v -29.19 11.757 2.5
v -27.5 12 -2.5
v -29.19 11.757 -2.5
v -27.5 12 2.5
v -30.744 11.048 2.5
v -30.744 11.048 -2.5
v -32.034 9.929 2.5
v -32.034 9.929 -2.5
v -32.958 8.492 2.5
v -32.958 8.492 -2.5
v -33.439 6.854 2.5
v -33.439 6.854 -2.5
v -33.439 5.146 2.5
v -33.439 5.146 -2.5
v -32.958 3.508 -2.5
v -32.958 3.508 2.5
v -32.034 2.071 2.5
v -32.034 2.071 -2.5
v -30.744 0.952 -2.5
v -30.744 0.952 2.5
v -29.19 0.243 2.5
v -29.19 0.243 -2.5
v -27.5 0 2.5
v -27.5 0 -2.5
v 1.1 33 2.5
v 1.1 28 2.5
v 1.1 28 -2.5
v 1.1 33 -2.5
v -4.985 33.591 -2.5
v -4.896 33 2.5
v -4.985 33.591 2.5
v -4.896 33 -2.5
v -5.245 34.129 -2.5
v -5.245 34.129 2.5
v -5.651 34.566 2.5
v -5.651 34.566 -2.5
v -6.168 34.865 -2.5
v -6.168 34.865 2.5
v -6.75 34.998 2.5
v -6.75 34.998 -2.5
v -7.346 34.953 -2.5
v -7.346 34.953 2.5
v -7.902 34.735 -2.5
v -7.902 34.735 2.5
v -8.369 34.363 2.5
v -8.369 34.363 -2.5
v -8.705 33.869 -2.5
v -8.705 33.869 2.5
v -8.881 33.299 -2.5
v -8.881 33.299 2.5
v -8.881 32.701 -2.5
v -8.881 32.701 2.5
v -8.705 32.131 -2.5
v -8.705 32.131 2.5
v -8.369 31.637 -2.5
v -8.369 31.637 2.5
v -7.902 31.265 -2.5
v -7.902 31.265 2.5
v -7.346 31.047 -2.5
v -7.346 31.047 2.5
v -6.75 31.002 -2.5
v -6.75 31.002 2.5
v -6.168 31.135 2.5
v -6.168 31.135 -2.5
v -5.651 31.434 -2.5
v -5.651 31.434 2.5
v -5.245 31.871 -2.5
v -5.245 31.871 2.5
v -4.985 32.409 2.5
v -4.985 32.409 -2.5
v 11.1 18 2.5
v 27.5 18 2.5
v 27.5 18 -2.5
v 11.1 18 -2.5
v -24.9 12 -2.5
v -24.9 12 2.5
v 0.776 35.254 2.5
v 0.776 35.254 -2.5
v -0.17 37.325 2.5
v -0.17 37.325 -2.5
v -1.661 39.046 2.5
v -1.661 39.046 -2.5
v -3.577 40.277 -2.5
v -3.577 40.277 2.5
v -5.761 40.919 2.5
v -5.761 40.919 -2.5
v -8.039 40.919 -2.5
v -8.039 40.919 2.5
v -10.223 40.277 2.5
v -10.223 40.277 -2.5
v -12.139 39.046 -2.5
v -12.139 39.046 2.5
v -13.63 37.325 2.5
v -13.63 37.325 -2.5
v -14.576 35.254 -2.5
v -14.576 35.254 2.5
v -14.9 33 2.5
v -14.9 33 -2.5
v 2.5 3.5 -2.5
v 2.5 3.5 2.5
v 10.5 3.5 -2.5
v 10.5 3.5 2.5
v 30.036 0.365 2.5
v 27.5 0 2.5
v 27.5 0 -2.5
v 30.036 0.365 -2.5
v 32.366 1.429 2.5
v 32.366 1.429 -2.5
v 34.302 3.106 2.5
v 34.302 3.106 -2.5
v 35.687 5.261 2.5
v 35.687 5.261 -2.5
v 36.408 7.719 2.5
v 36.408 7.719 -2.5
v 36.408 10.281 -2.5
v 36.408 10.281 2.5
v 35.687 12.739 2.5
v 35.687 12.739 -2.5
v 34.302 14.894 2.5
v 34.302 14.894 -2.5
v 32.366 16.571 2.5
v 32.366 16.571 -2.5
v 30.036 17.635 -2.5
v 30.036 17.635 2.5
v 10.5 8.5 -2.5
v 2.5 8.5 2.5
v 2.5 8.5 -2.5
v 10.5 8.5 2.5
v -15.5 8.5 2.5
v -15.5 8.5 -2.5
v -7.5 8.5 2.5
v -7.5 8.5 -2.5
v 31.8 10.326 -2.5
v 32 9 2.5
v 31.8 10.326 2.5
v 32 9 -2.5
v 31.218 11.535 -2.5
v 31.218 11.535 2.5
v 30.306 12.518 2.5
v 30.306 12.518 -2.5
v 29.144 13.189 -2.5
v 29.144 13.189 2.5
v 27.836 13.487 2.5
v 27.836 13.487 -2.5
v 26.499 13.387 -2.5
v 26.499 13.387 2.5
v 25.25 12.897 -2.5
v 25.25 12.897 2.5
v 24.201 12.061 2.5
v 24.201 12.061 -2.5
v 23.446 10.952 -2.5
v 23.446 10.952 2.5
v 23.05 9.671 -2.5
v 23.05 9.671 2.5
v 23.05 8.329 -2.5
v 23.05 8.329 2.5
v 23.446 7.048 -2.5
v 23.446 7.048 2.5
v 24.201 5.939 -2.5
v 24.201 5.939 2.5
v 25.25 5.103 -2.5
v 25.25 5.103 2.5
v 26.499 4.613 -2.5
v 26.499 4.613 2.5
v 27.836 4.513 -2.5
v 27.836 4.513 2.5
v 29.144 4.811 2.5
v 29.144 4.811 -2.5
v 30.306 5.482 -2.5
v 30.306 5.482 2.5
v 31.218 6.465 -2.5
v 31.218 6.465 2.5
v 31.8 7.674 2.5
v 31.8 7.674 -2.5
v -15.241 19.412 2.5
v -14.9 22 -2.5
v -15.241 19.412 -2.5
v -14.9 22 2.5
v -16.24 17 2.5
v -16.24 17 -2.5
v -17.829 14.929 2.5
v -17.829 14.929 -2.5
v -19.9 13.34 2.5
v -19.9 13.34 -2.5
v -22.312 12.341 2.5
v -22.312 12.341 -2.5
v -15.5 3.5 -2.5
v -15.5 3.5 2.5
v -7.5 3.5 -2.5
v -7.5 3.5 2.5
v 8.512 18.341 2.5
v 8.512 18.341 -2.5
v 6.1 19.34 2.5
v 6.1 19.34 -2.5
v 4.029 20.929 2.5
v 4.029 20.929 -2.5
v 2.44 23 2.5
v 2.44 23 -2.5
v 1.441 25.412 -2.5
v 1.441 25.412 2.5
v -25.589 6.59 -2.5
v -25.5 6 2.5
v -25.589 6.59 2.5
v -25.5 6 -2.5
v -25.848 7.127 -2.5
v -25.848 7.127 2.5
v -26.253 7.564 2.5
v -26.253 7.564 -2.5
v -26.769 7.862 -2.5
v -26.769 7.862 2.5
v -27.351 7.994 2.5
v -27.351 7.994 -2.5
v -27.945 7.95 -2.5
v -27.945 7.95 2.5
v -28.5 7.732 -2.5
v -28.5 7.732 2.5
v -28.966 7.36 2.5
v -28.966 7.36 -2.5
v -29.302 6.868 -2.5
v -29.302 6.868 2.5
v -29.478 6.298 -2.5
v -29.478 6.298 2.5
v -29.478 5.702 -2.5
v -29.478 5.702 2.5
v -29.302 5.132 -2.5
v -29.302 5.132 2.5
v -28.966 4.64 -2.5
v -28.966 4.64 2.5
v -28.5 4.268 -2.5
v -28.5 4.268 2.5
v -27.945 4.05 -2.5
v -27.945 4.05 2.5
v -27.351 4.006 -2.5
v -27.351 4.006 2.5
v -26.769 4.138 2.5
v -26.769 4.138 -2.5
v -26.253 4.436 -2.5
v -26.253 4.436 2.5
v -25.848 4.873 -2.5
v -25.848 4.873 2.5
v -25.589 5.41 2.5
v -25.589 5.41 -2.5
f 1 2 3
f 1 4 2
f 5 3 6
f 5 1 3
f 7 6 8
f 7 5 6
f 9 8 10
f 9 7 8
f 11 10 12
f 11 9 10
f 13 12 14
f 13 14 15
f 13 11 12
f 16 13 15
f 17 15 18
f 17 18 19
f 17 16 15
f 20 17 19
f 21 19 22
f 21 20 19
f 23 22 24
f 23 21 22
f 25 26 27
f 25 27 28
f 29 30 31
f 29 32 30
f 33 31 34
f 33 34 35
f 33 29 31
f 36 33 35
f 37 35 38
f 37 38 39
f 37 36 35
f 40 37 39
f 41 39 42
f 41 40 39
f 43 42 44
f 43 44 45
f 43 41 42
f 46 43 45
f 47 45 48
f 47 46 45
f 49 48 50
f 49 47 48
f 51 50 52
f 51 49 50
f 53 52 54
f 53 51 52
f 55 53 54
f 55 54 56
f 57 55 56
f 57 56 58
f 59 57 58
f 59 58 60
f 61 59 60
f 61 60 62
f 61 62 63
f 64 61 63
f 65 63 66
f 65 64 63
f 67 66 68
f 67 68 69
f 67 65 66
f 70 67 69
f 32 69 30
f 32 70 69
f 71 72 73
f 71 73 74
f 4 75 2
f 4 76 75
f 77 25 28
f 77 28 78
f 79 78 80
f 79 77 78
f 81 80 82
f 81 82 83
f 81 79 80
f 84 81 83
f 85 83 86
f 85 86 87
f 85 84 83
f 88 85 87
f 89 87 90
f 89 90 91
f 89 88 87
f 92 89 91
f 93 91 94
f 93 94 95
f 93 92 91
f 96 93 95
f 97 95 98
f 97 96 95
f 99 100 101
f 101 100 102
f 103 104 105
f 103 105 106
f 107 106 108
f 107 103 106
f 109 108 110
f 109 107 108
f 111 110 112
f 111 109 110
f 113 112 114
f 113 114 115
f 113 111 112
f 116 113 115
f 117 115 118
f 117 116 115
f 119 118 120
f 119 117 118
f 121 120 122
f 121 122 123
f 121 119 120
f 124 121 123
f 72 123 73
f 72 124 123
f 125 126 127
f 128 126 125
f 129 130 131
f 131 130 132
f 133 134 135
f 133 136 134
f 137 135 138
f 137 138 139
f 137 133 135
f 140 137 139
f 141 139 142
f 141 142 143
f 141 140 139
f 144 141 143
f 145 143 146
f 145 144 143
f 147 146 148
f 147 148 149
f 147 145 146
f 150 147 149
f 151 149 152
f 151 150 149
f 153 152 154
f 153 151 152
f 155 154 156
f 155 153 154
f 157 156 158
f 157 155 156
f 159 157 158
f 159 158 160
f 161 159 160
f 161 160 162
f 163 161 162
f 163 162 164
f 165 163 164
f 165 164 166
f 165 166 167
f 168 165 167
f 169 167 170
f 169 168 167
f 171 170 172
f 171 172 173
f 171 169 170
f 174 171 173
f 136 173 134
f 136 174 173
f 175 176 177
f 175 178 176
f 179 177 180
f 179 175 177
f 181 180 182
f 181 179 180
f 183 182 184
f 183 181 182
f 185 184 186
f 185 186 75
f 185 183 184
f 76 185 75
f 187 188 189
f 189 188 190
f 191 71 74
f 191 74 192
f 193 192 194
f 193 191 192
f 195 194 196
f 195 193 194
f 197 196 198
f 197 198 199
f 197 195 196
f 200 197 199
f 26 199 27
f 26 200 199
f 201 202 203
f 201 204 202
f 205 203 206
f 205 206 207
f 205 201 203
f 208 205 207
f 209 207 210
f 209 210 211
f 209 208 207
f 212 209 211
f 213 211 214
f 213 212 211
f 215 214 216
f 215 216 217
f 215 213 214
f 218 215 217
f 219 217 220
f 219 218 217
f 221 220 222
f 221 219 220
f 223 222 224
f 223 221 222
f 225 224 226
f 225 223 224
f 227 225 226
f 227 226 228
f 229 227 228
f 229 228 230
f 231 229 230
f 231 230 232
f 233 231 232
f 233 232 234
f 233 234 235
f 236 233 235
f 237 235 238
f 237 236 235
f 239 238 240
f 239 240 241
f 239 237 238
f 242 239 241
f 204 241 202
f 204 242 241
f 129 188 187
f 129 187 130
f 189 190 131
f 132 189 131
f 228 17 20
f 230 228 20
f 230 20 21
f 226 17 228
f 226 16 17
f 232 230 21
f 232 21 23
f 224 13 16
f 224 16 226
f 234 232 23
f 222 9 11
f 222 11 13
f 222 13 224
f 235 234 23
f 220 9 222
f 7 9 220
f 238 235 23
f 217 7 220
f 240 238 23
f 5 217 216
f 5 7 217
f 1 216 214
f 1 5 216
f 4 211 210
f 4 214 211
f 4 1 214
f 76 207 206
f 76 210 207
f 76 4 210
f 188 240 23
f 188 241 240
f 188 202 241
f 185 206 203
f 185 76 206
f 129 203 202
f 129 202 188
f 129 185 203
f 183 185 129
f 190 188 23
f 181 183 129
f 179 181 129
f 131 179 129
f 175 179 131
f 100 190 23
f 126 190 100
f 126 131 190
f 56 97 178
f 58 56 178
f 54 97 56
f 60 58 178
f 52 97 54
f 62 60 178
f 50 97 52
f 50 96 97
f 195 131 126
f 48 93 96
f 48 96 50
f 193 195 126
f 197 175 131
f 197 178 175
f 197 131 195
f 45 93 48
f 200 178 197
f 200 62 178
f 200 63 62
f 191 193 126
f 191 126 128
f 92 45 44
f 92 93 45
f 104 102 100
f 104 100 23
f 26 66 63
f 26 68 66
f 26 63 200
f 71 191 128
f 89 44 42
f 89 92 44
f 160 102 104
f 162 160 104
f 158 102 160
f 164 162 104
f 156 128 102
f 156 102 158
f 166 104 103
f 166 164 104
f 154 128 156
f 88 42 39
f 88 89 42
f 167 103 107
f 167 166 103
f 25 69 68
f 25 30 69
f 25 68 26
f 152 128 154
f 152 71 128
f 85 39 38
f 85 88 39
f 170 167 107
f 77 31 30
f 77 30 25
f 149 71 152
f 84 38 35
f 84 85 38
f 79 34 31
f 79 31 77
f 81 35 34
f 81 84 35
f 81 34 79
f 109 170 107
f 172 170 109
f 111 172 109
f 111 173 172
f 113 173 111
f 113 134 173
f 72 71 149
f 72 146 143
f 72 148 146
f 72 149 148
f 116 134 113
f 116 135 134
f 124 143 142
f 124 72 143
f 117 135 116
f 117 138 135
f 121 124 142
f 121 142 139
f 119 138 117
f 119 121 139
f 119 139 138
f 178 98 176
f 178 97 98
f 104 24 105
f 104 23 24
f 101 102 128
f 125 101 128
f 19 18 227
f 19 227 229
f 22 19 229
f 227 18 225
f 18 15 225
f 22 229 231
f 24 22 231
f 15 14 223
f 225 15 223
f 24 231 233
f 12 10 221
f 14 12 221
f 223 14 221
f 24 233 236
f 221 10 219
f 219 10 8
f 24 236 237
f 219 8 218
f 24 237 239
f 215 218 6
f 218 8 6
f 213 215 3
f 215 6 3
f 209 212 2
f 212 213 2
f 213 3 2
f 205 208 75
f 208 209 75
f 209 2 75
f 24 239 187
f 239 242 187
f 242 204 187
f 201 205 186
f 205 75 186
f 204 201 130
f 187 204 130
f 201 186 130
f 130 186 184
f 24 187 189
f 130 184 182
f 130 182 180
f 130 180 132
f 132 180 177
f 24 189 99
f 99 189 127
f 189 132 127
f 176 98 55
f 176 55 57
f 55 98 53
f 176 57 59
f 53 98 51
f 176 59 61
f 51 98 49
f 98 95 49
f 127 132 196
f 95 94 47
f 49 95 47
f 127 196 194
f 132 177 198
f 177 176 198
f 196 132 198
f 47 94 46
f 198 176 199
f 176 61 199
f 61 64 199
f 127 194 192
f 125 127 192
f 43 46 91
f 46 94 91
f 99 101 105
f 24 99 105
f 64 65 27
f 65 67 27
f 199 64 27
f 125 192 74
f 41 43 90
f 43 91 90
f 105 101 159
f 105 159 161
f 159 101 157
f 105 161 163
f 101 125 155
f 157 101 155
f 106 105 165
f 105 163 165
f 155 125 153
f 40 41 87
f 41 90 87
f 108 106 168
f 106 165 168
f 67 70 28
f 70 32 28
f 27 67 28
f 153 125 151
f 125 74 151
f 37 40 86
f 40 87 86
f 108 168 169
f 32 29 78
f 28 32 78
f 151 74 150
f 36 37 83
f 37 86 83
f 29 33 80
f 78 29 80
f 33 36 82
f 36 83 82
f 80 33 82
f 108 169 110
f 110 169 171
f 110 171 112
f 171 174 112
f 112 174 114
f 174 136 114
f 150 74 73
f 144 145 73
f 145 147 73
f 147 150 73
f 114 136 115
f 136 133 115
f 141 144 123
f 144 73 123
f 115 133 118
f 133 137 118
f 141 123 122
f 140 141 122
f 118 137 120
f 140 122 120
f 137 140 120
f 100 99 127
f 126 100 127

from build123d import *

# Parameters (mm, degrees)
SKETCH1_R           = 4.5
SKETCH1_R_2         = 2
SKETCH1_R_3         = 2.003539683
SKETCH1_W           = 8
SKETCH1_H           = 5
BOSS_EXTRUDE1_DEPTH = 2.5


with BuildPart() as part:
    # Sketch1 → Boss-Extrude1 (new, symmetric)
    with BuildSketch(Plane.XY):
        with BuildLine():
            Line((-27.5, 0), (27.5, 0))
            ThreePointArc((27.5, 0), (36.5, 9), (27.5, 18))
            Line((27.5, 18), (11.1, 18))
            ThreePointArc((11.1, 18), (4.028932188, 20.928932188), (1.1, 28))
            Line((1.1, 28), (1.1, 33))
            ThreePointArc((1.1, 33), (-6.9, 41), (-14.9, 33))
            Line((-14.9, 33), (-14.9, 22))
            ThreePointArc((-14.9, 22), (-17.828932188, 14.928932188), (-24.9, 12))
            Line((-24.9, 12), (-27.5, 12))
            ThreePointArc((-27.5, 12), (-33.5, 6), (-27.5, 0))
        make_face()
        with Locations((27.5, 9)):
            Circle(SKETCH1_R, mode=Mode.SUBTRACT)
        with Locations((-27.5, 6)):
            Circle(SKETCH1_R_2, mode=Mode.SUBTRACT)
        with Locations((-6.9, 33)):
            Circle(SKETCH1_R_3, mode=Mode.SUBTRACT)
        with Locations((-11.5, 6)):
            Rectangle(SKETCH1_W, SKETCH1_H, mode=Mode.SUBTRACT)
        with Locations((6.5, 6)):
            Rectangle(SKETCH1_W, SKETCH1_H, mode=Mode.SUBTRACT)
    extrude(amount=BOSS_EXTRUDE1_DEPTH, both=True)


solid = part.part
